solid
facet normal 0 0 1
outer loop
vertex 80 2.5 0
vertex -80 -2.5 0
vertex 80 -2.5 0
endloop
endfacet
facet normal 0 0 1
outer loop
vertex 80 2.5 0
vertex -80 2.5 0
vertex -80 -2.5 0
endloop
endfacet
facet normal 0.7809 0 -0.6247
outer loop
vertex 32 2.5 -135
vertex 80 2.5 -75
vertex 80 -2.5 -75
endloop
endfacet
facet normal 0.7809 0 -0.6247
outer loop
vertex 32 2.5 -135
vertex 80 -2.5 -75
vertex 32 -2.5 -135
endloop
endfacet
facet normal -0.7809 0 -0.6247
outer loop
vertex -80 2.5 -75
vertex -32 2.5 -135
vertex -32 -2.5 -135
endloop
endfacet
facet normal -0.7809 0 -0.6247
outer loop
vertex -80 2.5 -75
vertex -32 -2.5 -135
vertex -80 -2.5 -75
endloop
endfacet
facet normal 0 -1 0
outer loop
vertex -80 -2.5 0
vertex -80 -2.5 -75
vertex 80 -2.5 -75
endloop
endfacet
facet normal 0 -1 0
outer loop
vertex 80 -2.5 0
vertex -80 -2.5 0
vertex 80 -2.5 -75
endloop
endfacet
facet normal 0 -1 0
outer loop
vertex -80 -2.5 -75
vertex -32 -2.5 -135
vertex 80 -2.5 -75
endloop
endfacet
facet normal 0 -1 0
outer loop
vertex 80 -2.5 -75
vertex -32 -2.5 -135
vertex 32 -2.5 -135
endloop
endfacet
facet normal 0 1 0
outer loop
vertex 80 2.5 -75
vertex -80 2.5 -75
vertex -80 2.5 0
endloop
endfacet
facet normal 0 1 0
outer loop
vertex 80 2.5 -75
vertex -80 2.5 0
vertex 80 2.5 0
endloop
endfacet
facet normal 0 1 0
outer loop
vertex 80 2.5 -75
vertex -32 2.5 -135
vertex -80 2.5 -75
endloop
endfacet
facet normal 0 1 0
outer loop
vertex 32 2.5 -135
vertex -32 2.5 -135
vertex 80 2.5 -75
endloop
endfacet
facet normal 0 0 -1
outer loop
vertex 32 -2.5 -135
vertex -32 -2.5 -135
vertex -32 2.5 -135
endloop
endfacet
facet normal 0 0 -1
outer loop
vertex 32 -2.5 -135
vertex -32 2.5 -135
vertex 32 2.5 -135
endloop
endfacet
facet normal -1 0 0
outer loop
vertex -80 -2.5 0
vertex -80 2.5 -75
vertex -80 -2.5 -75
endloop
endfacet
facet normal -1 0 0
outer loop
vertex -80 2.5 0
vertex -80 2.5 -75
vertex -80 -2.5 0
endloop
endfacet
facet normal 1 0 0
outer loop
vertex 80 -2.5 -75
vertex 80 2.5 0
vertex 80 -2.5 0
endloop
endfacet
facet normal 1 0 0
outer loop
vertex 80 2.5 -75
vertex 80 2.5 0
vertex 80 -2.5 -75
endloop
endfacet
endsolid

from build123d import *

# Parameters (mm, degrees)
BOSS_EXTRUDE1_DEPTH     = 2.5
CUT_EXTRUDE1_DEPTH      = 193.435053979
CUT_EXTRUDE1_DEPTH_BACK = 193.435053979
SKETCH2_W               = 350
SKETCH2_H               = 40


with BuildPart() as part:
    # Sketch1 → Boss-Extrude1 (new, symmetric)
    with BuildSketch(Plane(origin=(0, 0, 0), x_dir=(1, 0, 0), z_dir=(0, 1, 0))):
        Polygon((-80, 0), (80, 0), (80, 75), (0, 175), (-80, 75), align=None)
    extrude(amount=BOSS_EXTRUDE1_DEPTH, both=True)

    # Sketch2 → Cut-Extrude1 (cut, two sides: drawn at the far end of the back side and taken through both)
    with BuildSketch(Plane(origin=(0, 0, 0), x_dir=(1, 0, 0), z_dir=(0, 1, 0)).offset(-CUT_EXTRUDE1_DEPTH_BACK)):
        with Locations((0, 155)):
            Rectangle(SKETCH2_W, SKETCH2_H)
    extrude(amount=CUT_EXTRUDE1_DEPTH + CUT_EXTRUDE1_DEPTH_BACK, mode=Mode.SUBTRACT)


solid = part.part
